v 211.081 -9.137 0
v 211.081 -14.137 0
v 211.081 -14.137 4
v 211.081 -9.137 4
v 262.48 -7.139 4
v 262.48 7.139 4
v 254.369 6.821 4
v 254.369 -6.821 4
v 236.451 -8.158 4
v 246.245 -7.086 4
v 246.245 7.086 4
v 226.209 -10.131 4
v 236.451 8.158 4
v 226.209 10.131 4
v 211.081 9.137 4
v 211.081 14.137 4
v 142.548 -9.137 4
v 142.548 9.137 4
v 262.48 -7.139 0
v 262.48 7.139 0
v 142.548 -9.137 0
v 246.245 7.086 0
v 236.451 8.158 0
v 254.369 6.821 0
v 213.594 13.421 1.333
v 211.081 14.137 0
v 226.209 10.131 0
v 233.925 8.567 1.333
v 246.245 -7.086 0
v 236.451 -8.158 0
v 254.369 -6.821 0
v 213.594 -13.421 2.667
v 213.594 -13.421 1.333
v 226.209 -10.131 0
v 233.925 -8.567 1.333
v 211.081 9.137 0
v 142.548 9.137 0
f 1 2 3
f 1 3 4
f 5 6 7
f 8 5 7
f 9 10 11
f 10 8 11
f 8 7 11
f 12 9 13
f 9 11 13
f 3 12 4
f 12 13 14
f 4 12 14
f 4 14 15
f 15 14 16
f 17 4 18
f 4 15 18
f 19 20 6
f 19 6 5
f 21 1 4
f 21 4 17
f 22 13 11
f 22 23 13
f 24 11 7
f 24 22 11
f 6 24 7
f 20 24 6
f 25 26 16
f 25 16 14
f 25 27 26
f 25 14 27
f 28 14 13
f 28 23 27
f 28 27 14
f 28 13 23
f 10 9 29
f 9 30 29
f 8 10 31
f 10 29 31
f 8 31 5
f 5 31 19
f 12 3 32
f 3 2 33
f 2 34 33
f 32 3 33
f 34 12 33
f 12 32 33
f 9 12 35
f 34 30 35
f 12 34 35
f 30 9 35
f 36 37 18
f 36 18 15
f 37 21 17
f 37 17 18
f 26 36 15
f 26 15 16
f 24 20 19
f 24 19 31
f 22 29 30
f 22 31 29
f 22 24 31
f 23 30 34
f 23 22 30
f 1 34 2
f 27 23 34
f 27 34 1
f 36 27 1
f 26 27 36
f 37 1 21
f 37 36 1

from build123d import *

# Parameters (mm, degrees)
BOSS_EXTRUDE1_DEPTH = 4


with BuildPart() as part:
    # Sketch2 → Boss-Extrude1 (new body)
    with BuildSketch(Plane.XY):
        with BuildLine():
            Line((262.480297025, 7.13882444), (262.480297025, -7.13882444))
            add(Edge.make_bspline(
                [(211.080761054, -14.13724363), (211.917848379, -13.89687615), (219.460294723, -11.745335639), (236.298901932, -7.327257032), (252.970465499, -6.414227327), (262.480297025, -7.13882444)],
                knots=[0.460880267, 0.460880267, 0.460880267, 0.460880267, 0.487879211, 0.704009033, 1, 1, 1, 1], degree=3))
            Line((211.080761054, -14.13724363), (211.080761054, -9.13724363))
            Line((211.080761054, -9.13724363), (142.548046426, -9.13724363))
            Line((142.548046426, -9.13724363), (142.548046426, 9.13724363))
            Line((142.548046426, 9.13724363), (211.080761054, 9.13724363))
            Line((211.080761054, 9.13724363), (211.080761054, 14.13724363))
            add(Edge.make_bspline(
                [(211.080761054, 14.13724363), (211.917848379, 13.89687615), (219.460294722, 11.745335639), (236.298901932, 7.327257032), (252.970465499, 6.414227327), (262.480297025, 7.13882444)],
                knots=[0.460880267, 0.460880267, 0.460880267, 0.460880267, 0.487879211, 0.704009033, 1, 1, 1, 1], degree=3))
        make_face()
    extrude(amount=BOSS_EXTRUDE1_DEPTH)


solid = part.part
